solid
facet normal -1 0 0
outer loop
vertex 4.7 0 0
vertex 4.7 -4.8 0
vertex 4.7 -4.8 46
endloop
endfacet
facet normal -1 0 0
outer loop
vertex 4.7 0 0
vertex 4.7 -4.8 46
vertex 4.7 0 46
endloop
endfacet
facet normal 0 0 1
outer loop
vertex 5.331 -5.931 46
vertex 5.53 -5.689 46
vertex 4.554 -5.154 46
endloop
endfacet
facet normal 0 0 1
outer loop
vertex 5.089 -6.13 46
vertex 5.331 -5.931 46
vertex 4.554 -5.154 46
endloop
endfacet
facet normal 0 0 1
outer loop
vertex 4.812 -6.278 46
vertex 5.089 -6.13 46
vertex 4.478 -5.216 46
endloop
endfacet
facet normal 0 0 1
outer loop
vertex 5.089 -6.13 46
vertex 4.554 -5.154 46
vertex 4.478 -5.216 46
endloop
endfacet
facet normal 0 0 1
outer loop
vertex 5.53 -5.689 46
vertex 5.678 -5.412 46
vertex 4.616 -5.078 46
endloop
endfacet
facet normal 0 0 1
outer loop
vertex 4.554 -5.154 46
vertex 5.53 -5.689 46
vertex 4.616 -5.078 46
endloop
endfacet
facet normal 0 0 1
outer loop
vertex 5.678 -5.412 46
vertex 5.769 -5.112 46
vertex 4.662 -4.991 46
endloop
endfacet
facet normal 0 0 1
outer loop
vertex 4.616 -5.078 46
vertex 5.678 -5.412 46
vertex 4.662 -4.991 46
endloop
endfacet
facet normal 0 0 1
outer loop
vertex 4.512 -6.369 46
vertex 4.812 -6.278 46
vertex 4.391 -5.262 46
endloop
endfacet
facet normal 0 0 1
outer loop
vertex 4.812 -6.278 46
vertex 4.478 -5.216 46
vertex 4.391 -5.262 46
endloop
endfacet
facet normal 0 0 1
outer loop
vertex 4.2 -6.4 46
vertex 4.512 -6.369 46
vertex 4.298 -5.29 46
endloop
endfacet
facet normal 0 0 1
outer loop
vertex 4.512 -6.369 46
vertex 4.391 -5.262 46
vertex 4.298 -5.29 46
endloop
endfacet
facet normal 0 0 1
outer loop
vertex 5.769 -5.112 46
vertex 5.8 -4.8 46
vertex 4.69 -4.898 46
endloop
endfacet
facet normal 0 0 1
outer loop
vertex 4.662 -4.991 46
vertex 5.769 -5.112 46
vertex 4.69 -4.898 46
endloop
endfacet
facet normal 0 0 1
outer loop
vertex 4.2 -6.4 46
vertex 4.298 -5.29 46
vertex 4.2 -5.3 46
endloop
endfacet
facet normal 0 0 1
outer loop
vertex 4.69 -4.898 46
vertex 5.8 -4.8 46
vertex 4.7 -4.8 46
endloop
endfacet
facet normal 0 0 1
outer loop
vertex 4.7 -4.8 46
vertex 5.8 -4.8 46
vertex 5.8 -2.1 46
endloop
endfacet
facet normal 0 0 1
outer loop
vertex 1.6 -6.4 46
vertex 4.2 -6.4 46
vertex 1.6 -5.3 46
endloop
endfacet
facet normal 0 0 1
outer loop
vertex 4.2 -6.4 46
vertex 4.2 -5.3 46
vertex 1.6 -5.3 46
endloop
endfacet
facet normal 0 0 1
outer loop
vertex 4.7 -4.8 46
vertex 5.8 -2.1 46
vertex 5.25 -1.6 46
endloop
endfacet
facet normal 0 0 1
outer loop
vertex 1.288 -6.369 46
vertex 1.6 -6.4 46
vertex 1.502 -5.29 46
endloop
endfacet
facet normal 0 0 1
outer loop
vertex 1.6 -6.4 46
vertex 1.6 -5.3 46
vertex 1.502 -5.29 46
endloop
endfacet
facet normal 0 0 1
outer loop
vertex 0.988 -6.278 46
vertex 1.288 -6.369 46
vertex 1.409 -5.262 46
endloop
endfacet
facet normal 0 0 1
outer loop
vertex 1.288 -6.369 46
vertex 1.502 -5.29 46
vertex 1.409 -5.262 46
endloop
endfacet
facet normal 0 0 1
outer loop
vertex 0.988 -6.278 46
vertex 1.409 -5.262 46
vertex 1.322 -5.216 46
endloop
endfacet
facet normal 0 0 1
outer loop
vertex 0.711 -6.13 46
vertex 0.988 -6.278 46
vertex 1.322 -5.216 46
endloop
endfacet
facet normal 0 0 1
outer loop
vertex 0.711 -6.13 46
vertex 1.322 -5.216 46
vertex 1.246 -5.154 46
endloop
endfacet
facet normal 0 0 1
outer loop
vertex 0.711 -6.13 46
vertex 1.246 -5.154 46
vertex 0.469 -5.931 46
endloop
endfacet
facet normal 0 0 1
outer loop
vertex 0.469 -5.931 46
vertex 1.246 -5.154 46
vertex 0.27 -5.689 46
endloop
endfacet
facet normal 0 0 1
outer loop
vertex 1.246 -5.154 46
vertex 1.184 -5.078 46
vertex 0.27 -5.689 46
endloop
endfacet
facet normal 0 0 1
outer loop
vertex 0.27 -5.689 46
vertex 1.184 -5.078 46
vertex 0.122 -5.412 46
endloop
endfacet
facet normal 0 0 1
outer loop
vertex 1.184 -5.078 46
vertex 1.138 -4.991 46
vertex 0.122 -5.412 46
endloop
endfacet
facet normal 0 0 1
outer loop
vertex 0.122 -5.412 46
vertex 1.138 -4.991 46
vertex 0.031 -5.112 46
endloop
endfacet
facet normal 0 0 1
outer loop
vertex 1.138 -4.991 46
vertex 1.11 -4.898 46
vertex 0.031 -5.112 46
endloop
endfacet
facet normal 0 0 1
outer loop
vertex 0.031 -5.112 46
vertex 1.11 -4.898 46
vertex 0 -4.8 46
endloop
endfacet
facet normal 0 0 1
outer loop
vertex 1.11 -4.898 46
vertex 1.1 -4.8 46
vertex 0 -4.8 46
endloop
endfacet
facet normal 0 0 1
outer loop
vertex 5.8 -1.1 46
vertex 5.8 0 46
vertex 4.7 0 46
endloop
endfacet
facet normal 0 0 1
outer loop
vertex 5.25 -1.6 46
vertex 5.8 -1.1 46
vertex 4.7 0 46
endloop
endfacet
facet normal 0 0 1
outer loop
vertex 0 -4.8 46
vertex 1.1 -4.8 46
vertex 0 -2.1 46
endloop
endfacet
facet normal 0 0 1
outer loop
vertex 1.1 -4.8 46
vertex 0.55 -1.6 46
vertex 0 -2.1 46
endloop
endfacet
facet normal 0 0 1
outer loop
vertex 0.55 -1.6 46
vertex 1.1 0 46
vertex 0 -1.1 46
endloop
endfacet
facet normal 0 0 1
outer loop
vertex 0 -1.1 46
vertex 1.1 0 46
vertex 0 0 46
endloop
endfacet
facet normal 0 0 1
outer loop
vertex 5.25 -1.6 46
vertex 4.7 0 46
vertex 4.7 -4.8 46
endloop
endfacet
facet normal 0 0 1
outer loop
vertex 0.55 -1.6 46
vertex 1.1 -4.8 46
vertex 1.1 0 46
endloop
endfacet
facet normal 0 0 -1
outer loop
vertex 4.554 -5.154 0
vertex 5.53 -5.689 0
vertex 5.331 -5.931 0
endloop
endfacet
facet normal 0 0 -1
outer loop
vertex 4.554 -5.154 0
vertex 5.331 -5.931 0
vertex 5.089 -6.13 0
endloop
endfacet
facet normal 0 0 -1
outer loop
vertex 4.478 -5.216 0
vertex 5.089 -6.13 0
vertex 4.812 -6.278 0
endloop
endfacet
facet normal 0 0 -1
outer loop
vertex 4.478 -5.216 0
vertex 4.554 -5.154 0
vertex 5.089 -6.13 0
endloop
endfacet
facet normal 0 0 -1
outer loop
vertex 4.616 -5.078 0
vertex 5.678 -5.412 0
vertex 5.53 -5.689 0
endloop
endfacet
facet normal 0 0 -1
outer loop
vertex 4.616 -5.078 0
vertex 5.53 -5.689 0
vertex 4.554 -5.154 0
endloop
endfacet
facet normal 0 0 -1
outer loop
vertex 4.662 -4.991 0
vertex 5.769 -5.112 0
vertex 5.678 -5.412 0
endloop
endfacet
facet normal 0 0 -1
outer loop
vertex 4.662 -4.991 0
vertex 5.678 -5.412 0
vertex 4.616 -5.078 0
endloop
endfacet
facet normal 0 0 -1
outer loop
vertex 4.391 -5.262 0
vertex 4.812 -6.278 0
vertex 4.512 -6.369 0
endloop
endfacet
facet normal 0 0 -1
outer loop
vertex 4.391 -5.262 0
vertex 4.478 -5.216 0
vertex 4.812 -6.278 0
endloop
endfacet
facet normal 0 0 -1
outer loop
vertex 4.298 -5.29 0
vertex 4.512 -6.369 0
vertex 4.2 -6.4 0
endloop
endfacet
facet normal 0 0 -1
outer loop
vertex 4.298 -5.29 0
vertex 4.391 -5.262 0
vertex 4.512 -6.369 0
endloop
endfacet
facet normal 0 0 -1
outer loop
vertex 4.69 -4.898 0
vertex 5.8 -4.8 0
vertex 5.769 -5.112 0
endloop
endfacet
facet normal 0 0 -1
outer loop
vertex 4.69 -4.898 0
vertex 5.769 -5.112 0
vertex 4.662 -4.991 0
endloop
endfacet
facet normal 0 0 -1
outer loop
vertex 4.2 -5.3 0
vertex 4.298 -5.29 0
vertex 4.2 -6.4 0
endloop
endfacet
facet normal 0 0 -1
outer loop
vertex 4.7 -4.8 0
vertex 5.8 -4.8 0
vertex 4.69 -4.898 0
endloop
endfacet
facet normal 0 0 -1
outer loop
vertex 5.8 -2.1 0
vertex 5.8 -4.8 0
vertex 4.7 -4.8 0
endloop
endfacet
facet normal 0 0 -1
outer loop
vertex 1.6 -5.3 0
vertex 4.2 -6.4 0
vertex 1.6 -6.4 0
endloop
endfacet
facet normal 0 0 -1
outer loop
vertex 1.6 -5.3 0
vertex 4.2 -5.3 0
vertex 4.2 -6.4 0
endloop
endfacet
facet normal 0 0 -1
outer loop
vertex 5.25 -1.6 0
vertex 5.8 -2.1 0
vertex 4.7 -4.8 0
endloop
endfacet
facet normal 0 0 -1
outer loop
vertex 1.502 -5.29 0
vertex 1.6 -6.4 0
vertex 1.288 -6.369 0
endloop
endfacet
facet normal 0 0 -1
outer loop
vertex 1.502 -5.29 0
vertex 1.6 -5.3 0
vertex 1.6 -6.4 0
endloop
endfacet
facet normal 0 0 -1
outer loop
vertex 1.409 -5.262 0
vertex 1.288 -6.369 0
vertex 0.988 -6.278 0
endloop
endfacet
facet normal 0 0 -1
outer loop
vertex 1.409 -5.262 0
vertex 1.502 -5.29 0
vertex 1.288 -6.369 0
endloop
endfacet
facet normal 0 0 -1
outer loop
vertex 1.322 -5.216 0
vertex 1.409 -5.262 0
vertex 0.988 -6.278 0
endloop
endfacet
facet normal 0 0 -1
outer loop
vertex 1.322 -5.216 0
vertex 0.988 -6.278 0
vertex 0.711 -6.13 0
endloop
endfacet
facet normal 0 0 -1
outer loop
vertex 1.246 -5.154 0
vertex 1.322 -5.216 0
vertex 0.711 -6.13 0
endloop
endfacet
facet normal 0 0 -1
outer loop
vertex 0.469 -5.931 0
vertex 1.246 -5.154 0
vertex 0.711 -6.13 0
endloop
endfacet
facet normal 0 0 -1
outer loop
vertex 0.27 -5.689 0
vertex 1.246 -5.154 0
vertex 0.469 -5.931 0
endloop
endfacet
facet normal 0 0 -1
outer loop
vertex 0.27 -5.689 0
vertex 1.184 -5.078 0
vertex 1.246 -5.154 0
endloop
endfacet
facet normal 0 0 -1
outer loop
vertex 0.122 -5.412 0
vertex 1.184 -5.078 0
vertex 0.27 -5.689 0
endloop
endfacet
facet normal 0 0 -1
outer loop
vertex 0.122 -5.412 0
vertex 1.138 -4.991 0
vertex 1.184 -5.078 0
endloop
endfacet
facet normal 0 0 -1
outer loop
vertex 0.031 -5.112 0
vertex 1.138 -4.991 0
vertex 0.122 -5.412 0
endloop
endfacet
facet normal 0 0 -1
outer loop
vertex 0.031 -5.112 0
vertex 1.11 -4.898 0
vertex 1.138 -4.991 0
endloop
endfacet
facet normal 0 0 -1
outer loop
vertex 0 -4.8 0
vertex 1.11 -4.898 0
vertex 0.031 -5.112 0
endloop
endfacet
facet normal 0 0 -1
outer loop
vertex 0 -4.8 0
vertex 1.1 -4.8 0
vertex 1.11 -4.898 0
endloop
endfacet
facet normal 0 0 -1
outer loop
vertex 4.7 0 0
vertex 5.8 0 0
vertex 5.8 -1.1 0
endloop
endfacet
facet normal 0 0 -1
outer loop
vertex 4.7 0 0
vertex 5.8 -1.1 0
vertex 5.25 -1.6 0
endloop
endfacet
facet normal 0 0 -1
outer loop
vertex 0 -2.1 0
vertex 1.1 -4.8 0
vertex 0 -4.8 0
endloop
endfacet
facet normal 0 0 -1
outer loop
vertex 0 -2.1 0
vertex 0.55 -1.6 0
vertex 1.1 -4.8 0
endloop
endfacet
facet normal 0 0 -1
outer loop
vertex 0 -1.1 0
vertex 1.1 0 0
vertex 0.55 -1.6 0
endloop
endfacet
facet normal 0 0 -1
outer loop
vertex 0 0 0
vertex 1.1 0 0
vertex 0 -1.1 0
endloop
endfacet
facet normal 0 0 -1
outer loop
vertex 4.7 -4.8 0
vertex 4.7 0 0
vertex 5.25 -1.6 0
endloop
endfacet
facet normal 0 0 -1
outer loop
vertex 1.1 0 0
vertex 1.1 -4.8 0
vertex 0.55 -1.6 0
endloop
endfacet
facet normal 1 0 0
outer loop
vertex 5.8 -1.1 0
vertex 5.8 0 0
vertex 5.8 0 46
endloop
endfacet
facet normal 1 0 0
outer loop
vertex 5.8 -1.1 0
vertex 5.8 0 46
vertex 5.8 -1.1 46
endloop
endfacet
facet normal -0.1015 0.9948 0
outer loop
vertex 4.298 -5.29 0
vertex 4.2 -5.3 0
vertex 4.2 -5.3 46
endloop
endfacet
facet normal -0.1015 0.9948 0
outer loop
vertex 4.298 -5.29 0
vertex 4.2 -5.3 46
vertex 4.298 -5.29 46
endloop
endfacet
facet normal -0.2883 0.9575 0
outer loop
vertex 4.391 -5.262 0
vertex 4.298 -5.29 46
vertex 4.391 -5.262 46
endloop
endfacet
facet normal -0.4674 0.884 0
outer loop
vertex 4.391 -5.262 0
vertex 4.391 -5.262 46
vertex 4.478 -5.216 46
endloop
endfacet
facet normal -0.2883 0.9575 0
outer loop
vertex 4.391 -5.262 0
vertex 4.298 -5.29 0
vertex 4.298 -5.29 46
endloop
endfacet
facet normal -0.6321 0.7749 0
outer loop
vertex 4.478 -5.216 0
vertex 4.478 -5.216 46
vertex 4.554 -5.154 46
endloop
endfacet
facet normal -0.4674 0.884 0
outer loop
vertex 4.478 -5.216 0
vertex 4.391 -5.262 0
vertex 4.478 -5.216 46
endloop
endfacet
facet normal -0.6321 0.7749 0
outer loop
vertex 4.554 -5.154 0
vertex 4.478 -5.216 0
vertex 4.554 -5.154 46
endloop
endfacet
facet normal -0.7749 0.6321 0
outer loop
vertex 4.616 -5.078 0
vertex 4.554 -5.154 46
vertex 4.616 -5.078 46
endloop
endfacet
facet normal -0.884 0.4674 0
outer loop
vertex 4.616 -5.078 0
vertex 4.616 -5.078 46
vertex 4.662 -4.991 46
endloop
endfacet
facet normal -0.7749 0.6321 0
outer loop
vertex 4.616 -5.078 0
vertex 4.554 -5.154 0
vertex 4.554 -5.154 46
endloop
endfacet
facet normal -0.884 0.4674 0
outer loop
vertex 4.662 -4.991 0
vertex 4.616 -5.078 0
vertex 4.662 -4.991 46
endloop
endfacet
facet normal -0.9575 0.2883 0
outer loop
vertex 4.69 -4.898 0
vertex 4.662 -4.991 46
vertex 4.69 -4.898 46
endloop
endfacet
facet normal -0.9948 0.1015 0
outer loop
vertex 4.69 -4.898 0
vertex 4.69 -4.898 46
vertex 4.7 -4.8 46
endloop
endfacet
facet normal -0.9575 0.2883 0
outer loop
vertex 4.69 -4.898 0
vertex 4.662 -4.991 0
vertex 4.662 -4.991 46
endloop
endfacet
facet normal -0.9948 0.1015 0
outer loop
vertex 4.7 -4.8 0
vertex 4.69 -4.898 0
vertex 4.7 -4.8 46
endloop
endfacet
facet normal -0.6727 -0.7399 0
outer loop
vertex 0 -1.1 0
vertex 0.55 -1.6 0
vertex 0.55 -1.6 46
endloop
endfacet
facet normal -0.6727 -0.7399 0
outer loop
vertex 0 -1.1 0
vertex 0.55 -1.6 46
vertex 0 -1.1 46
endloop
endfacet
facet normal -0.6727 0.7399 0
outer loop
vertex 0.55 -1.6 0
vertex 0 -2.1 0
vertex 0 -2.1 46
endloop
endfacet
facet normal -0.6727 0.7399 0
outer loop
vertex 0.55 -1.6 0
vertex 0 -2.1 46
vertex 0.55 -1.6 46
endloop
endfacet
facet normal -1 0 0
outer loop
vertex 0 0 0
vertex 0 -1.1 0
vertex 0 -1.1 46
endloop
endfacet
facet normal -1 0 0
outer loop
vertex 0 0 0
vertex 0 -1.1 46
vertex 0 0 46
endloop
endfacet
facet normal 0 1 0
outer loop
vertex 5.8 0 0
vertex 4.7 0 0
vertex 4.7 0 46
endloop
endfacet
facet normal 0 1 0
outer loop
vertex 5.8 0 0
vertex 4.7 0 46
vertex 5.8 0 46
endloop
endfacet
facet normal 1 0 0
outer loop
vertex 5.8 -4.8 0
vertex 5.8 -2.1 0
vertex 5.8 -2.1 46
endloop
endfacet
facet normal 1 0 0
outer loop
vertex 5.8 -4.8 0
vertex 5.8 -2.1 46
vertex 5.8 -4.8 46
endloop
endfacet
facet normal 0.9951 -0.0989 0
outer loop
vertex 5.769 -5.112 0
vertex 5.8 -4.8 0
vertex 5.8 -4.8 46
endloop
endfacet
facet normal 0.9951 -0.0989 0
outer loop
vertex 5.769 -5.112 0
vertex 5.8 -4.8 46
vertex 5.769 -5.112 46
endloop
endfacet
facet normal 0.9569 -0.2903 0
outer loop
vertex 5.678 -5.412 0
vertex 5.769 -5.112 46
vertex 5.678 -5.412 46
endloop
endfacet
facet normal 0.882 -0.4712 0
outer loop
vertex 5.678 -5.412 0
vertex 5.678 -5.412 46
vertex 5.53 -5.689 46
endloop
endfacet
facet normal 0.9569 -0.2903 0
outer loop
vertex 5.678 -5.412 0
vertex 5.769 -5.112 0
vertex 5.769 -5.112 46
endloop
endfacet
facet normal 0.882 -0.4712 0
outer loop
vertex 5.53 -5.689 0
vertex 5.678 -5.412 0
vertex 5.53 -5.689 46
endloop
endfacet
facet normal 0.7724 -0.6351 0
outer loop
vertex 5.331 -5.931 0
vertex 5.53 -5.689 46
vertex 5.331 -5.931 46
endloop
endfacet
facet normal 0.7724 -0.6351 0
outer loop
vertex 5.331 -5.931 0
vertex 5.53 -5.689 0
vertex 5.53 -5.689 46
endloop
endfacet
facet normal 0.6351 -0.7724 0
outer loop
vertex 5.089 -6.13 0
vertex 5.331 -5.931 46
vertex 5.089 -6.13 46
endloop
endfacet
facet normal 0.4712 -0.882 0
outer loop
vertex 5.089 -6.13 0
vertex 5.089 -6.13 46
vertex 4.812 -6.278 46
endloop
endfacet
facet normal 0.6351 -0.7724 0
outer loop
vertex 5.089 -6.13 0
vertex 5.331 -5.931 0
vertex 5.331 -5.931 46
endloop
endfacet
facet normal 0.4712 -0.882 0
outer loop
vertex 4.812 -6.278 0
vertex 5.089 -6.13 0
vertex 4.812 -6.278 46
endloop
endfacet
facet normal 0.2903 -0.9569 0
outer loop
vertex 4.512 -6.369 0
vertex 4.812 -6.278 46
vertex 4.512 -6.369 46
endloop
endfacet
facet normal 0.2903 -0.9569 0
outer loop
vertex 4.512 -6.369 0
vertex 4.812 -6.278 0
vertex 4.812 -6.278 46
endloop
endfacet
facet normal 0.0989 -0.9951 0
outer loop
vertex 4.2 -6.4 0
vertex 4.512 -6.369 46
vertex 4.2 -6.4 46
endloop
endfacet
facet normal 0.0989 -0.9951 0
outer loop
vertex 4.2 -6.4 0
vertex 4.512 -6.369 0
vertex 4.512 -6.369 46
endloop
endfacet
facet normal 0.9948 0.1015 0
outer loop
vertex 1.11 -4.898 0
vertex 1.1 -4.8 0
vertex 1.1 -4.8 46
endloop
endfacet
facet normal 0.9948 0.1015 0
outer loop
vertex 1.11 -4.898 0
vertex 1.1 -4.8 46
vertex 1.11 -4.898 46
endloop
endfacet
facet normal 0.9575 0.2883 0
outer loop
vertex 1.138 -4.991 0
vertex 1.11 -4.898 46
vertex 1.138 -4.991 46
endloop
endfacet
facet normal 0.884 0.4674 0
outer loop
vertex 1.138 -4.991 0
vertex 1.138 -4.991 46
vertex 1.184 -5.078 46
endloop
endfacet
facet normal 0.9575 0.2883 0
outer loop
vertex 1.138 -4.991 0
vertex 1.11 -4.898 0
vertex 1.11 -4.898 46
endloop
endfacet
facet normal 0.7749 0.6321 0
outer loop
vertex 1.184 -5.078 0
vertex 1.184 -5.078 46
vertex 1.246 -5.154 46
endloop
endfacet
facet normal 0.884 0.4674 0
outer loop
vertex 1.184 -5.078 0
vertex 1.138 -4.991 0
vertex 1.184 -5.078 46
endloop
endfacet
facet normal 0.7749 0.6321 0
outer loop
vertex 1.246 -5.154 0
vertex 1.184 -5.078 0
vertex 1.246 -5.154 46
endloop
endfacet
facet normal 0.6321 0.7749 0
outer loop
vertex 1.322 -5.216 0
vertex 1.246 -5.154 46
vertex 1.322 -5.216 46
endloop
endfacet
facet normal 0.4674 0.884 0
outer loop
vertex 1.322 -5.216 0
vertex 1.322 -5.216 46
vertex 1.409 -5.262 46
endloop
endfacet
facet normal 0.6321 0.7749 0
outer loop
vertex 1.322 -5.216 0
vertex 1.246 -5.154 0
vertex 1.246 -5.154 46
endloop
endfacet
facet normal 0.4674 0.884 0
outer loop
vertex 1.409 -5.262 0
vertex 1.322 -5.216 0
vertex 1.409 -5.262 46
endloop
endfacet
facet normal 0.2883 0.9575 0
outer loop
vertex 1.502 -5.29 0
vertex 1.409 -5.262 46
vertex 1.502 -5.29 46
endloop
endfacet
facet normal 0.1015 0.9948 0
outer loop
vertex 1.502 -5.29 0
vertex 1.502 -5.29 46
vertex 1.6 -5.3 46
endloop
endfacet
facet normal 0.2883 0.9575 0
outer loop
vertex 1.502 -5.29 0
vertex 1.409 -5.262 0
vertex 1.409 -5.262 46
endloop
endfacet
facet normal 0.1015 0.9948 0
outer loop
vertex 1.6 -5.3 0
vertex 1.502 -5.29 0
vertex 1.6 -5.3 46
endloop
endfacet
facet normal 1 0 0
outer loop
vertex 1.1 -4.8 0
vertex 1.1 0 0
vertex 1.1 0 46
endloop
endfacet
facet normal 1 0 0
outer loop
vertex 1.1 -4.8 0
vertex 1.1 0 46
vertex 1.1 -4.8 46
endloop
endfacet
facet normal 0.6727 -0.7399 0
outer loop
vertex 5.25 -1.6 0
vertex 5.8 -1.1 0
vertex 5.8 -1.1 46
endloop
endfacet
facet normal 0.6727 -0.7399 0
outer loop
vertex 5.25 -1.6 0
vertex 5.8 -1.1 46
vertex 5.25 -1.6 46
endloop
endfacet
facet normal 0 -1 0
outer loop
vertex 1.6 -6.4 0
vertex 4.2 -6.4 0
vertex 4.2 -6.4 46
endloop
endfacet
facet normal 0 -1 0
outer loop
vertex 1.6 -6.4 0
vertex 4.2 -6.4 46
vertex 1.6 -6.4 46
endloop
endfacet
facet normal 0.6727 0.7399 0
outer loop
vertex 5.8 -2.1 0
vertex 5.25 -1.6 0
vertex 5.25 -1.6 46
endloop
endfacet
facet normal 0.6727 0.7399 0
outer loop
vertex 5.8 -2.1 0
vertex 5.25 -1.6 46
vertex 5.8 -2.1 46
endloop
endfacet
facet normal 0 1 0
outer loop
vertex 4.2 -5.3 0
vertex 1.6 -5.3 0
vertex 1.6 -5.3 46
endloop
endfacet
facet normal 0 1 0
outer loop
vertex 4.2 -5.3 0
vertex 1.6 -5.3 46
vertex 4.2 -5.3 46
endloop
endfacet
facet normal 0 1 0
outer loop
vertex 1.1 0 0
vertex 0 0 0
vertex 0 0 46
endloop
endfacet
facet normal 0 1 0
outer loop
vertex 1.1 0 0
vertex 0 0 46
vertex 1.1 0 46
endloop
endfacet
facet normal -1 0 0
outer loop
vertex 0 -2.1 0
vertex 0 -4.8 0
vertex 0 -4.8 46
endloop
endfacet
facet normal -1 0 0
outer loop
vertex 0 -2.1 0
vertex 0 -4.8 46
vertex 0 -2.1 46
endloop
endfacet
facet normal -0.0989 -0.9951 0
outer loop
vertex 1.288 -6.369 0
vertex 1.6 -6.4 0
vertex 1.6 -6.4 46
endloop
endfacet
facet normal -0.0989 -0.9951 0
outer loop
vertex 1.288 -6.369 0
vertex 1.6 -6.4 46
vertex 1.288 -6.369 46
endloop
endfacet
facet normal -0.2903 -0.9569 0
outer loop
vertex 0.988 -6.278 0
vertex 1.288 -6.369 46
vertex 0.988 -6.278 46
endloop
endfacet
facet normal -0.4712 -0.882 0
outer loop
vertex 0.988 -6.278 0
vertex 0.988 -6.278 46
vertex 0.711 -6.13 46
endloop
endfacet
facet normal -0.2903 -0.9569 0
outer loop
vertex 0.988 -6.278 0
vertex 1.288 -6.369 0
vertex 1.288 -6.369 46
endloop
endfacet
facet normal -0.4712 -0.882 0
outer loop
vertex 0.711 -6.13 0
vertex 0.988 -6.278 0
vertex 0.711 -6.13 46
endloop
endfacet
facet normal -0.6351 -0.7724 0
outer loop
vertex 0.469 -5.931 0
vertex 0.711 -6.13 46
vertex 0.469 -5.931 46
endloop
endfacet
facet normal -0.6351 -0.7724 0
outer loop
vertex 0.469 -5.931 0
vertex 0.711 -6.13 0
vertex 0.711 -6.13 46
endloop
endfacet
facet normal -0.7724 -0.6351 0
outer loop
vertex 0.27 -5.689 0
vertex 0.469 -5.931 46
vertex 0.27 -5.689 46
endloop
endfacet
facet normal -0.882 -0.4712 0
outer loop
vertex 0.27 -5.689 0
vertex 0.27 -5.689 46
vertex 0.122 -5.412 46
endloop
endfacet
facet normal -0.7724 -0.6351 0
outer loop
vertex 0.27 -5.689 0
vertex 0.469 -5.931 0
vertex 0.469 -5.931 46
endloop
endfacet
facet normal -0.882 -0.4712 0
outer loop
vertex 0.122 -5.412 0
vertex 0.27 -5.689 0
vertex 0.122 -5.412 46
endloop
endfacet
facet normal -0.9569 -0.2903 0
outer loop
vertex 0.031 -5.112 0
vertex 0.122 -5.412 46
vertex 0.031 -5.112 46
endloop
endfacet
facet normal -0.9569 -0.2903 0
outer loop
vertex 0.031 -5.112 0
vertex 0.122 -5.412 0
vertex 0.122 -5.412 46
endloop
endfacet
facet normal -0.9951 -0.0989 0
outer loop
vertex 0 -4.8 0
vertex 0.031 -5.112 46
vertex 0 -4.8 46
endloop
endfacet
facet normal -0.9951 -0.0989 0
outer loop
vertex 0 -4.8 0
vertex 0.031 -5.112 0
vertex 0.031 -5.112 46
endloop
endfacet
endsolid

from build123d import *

# Parameters (mm, degrees)
EXTRUSION1_DEPTH = 46


with BuildPart() as part:
    # Esquisse1 → Extrusion1 (new body)
    with BuildSketch(Plane.XY):
        with BuildLine():
            Line((4.7, -4.8), (4.7, 0))
            Line((4.7, 0), (5.8, 0))
            Line((5.8, 0), (5.8, -1.1))
            Line((5.8, -1.1), (5.25, -1.6))
            Line((5.25, -1.6), (5.8, -2.1))
            Line((5.8, -2.1), (5.8, -4.8))
            ThreePointArc((5.8, -4.8), (5.33137085, -5.93137085), (4.2, -6.4))
            Line((4.2, -6.4), (1.6, -6.4))
            ThreePointArc((1.6, -6.4), (0.46862915, -5.93137085), (0, -4.8))
            Line((0, -4.8), (0, -2.1))
            Line((0, -2.1), (0.55, -1.6))
            Line((0.55, -1.6), (0, -1.1))
            Line((0, -1.1), (0, 0))
            Line((0, 0), (1.1, 0))
            Line((1.1, 0), (1.1, -4.8))
            ThreePointArc((1.1, -4.8), (1.246446609, -5.153553391), (1.6, -5.3))
            Line((1.6, -5.3), (4.2, -5.3))
            ThreePointArc((4.2, -5.3), (4.553553391, -5.153553391), (4.7, -4.8))
        make_face()
    extrude(amount=EXTRUSION1_DEPTH)


solid = part.part
